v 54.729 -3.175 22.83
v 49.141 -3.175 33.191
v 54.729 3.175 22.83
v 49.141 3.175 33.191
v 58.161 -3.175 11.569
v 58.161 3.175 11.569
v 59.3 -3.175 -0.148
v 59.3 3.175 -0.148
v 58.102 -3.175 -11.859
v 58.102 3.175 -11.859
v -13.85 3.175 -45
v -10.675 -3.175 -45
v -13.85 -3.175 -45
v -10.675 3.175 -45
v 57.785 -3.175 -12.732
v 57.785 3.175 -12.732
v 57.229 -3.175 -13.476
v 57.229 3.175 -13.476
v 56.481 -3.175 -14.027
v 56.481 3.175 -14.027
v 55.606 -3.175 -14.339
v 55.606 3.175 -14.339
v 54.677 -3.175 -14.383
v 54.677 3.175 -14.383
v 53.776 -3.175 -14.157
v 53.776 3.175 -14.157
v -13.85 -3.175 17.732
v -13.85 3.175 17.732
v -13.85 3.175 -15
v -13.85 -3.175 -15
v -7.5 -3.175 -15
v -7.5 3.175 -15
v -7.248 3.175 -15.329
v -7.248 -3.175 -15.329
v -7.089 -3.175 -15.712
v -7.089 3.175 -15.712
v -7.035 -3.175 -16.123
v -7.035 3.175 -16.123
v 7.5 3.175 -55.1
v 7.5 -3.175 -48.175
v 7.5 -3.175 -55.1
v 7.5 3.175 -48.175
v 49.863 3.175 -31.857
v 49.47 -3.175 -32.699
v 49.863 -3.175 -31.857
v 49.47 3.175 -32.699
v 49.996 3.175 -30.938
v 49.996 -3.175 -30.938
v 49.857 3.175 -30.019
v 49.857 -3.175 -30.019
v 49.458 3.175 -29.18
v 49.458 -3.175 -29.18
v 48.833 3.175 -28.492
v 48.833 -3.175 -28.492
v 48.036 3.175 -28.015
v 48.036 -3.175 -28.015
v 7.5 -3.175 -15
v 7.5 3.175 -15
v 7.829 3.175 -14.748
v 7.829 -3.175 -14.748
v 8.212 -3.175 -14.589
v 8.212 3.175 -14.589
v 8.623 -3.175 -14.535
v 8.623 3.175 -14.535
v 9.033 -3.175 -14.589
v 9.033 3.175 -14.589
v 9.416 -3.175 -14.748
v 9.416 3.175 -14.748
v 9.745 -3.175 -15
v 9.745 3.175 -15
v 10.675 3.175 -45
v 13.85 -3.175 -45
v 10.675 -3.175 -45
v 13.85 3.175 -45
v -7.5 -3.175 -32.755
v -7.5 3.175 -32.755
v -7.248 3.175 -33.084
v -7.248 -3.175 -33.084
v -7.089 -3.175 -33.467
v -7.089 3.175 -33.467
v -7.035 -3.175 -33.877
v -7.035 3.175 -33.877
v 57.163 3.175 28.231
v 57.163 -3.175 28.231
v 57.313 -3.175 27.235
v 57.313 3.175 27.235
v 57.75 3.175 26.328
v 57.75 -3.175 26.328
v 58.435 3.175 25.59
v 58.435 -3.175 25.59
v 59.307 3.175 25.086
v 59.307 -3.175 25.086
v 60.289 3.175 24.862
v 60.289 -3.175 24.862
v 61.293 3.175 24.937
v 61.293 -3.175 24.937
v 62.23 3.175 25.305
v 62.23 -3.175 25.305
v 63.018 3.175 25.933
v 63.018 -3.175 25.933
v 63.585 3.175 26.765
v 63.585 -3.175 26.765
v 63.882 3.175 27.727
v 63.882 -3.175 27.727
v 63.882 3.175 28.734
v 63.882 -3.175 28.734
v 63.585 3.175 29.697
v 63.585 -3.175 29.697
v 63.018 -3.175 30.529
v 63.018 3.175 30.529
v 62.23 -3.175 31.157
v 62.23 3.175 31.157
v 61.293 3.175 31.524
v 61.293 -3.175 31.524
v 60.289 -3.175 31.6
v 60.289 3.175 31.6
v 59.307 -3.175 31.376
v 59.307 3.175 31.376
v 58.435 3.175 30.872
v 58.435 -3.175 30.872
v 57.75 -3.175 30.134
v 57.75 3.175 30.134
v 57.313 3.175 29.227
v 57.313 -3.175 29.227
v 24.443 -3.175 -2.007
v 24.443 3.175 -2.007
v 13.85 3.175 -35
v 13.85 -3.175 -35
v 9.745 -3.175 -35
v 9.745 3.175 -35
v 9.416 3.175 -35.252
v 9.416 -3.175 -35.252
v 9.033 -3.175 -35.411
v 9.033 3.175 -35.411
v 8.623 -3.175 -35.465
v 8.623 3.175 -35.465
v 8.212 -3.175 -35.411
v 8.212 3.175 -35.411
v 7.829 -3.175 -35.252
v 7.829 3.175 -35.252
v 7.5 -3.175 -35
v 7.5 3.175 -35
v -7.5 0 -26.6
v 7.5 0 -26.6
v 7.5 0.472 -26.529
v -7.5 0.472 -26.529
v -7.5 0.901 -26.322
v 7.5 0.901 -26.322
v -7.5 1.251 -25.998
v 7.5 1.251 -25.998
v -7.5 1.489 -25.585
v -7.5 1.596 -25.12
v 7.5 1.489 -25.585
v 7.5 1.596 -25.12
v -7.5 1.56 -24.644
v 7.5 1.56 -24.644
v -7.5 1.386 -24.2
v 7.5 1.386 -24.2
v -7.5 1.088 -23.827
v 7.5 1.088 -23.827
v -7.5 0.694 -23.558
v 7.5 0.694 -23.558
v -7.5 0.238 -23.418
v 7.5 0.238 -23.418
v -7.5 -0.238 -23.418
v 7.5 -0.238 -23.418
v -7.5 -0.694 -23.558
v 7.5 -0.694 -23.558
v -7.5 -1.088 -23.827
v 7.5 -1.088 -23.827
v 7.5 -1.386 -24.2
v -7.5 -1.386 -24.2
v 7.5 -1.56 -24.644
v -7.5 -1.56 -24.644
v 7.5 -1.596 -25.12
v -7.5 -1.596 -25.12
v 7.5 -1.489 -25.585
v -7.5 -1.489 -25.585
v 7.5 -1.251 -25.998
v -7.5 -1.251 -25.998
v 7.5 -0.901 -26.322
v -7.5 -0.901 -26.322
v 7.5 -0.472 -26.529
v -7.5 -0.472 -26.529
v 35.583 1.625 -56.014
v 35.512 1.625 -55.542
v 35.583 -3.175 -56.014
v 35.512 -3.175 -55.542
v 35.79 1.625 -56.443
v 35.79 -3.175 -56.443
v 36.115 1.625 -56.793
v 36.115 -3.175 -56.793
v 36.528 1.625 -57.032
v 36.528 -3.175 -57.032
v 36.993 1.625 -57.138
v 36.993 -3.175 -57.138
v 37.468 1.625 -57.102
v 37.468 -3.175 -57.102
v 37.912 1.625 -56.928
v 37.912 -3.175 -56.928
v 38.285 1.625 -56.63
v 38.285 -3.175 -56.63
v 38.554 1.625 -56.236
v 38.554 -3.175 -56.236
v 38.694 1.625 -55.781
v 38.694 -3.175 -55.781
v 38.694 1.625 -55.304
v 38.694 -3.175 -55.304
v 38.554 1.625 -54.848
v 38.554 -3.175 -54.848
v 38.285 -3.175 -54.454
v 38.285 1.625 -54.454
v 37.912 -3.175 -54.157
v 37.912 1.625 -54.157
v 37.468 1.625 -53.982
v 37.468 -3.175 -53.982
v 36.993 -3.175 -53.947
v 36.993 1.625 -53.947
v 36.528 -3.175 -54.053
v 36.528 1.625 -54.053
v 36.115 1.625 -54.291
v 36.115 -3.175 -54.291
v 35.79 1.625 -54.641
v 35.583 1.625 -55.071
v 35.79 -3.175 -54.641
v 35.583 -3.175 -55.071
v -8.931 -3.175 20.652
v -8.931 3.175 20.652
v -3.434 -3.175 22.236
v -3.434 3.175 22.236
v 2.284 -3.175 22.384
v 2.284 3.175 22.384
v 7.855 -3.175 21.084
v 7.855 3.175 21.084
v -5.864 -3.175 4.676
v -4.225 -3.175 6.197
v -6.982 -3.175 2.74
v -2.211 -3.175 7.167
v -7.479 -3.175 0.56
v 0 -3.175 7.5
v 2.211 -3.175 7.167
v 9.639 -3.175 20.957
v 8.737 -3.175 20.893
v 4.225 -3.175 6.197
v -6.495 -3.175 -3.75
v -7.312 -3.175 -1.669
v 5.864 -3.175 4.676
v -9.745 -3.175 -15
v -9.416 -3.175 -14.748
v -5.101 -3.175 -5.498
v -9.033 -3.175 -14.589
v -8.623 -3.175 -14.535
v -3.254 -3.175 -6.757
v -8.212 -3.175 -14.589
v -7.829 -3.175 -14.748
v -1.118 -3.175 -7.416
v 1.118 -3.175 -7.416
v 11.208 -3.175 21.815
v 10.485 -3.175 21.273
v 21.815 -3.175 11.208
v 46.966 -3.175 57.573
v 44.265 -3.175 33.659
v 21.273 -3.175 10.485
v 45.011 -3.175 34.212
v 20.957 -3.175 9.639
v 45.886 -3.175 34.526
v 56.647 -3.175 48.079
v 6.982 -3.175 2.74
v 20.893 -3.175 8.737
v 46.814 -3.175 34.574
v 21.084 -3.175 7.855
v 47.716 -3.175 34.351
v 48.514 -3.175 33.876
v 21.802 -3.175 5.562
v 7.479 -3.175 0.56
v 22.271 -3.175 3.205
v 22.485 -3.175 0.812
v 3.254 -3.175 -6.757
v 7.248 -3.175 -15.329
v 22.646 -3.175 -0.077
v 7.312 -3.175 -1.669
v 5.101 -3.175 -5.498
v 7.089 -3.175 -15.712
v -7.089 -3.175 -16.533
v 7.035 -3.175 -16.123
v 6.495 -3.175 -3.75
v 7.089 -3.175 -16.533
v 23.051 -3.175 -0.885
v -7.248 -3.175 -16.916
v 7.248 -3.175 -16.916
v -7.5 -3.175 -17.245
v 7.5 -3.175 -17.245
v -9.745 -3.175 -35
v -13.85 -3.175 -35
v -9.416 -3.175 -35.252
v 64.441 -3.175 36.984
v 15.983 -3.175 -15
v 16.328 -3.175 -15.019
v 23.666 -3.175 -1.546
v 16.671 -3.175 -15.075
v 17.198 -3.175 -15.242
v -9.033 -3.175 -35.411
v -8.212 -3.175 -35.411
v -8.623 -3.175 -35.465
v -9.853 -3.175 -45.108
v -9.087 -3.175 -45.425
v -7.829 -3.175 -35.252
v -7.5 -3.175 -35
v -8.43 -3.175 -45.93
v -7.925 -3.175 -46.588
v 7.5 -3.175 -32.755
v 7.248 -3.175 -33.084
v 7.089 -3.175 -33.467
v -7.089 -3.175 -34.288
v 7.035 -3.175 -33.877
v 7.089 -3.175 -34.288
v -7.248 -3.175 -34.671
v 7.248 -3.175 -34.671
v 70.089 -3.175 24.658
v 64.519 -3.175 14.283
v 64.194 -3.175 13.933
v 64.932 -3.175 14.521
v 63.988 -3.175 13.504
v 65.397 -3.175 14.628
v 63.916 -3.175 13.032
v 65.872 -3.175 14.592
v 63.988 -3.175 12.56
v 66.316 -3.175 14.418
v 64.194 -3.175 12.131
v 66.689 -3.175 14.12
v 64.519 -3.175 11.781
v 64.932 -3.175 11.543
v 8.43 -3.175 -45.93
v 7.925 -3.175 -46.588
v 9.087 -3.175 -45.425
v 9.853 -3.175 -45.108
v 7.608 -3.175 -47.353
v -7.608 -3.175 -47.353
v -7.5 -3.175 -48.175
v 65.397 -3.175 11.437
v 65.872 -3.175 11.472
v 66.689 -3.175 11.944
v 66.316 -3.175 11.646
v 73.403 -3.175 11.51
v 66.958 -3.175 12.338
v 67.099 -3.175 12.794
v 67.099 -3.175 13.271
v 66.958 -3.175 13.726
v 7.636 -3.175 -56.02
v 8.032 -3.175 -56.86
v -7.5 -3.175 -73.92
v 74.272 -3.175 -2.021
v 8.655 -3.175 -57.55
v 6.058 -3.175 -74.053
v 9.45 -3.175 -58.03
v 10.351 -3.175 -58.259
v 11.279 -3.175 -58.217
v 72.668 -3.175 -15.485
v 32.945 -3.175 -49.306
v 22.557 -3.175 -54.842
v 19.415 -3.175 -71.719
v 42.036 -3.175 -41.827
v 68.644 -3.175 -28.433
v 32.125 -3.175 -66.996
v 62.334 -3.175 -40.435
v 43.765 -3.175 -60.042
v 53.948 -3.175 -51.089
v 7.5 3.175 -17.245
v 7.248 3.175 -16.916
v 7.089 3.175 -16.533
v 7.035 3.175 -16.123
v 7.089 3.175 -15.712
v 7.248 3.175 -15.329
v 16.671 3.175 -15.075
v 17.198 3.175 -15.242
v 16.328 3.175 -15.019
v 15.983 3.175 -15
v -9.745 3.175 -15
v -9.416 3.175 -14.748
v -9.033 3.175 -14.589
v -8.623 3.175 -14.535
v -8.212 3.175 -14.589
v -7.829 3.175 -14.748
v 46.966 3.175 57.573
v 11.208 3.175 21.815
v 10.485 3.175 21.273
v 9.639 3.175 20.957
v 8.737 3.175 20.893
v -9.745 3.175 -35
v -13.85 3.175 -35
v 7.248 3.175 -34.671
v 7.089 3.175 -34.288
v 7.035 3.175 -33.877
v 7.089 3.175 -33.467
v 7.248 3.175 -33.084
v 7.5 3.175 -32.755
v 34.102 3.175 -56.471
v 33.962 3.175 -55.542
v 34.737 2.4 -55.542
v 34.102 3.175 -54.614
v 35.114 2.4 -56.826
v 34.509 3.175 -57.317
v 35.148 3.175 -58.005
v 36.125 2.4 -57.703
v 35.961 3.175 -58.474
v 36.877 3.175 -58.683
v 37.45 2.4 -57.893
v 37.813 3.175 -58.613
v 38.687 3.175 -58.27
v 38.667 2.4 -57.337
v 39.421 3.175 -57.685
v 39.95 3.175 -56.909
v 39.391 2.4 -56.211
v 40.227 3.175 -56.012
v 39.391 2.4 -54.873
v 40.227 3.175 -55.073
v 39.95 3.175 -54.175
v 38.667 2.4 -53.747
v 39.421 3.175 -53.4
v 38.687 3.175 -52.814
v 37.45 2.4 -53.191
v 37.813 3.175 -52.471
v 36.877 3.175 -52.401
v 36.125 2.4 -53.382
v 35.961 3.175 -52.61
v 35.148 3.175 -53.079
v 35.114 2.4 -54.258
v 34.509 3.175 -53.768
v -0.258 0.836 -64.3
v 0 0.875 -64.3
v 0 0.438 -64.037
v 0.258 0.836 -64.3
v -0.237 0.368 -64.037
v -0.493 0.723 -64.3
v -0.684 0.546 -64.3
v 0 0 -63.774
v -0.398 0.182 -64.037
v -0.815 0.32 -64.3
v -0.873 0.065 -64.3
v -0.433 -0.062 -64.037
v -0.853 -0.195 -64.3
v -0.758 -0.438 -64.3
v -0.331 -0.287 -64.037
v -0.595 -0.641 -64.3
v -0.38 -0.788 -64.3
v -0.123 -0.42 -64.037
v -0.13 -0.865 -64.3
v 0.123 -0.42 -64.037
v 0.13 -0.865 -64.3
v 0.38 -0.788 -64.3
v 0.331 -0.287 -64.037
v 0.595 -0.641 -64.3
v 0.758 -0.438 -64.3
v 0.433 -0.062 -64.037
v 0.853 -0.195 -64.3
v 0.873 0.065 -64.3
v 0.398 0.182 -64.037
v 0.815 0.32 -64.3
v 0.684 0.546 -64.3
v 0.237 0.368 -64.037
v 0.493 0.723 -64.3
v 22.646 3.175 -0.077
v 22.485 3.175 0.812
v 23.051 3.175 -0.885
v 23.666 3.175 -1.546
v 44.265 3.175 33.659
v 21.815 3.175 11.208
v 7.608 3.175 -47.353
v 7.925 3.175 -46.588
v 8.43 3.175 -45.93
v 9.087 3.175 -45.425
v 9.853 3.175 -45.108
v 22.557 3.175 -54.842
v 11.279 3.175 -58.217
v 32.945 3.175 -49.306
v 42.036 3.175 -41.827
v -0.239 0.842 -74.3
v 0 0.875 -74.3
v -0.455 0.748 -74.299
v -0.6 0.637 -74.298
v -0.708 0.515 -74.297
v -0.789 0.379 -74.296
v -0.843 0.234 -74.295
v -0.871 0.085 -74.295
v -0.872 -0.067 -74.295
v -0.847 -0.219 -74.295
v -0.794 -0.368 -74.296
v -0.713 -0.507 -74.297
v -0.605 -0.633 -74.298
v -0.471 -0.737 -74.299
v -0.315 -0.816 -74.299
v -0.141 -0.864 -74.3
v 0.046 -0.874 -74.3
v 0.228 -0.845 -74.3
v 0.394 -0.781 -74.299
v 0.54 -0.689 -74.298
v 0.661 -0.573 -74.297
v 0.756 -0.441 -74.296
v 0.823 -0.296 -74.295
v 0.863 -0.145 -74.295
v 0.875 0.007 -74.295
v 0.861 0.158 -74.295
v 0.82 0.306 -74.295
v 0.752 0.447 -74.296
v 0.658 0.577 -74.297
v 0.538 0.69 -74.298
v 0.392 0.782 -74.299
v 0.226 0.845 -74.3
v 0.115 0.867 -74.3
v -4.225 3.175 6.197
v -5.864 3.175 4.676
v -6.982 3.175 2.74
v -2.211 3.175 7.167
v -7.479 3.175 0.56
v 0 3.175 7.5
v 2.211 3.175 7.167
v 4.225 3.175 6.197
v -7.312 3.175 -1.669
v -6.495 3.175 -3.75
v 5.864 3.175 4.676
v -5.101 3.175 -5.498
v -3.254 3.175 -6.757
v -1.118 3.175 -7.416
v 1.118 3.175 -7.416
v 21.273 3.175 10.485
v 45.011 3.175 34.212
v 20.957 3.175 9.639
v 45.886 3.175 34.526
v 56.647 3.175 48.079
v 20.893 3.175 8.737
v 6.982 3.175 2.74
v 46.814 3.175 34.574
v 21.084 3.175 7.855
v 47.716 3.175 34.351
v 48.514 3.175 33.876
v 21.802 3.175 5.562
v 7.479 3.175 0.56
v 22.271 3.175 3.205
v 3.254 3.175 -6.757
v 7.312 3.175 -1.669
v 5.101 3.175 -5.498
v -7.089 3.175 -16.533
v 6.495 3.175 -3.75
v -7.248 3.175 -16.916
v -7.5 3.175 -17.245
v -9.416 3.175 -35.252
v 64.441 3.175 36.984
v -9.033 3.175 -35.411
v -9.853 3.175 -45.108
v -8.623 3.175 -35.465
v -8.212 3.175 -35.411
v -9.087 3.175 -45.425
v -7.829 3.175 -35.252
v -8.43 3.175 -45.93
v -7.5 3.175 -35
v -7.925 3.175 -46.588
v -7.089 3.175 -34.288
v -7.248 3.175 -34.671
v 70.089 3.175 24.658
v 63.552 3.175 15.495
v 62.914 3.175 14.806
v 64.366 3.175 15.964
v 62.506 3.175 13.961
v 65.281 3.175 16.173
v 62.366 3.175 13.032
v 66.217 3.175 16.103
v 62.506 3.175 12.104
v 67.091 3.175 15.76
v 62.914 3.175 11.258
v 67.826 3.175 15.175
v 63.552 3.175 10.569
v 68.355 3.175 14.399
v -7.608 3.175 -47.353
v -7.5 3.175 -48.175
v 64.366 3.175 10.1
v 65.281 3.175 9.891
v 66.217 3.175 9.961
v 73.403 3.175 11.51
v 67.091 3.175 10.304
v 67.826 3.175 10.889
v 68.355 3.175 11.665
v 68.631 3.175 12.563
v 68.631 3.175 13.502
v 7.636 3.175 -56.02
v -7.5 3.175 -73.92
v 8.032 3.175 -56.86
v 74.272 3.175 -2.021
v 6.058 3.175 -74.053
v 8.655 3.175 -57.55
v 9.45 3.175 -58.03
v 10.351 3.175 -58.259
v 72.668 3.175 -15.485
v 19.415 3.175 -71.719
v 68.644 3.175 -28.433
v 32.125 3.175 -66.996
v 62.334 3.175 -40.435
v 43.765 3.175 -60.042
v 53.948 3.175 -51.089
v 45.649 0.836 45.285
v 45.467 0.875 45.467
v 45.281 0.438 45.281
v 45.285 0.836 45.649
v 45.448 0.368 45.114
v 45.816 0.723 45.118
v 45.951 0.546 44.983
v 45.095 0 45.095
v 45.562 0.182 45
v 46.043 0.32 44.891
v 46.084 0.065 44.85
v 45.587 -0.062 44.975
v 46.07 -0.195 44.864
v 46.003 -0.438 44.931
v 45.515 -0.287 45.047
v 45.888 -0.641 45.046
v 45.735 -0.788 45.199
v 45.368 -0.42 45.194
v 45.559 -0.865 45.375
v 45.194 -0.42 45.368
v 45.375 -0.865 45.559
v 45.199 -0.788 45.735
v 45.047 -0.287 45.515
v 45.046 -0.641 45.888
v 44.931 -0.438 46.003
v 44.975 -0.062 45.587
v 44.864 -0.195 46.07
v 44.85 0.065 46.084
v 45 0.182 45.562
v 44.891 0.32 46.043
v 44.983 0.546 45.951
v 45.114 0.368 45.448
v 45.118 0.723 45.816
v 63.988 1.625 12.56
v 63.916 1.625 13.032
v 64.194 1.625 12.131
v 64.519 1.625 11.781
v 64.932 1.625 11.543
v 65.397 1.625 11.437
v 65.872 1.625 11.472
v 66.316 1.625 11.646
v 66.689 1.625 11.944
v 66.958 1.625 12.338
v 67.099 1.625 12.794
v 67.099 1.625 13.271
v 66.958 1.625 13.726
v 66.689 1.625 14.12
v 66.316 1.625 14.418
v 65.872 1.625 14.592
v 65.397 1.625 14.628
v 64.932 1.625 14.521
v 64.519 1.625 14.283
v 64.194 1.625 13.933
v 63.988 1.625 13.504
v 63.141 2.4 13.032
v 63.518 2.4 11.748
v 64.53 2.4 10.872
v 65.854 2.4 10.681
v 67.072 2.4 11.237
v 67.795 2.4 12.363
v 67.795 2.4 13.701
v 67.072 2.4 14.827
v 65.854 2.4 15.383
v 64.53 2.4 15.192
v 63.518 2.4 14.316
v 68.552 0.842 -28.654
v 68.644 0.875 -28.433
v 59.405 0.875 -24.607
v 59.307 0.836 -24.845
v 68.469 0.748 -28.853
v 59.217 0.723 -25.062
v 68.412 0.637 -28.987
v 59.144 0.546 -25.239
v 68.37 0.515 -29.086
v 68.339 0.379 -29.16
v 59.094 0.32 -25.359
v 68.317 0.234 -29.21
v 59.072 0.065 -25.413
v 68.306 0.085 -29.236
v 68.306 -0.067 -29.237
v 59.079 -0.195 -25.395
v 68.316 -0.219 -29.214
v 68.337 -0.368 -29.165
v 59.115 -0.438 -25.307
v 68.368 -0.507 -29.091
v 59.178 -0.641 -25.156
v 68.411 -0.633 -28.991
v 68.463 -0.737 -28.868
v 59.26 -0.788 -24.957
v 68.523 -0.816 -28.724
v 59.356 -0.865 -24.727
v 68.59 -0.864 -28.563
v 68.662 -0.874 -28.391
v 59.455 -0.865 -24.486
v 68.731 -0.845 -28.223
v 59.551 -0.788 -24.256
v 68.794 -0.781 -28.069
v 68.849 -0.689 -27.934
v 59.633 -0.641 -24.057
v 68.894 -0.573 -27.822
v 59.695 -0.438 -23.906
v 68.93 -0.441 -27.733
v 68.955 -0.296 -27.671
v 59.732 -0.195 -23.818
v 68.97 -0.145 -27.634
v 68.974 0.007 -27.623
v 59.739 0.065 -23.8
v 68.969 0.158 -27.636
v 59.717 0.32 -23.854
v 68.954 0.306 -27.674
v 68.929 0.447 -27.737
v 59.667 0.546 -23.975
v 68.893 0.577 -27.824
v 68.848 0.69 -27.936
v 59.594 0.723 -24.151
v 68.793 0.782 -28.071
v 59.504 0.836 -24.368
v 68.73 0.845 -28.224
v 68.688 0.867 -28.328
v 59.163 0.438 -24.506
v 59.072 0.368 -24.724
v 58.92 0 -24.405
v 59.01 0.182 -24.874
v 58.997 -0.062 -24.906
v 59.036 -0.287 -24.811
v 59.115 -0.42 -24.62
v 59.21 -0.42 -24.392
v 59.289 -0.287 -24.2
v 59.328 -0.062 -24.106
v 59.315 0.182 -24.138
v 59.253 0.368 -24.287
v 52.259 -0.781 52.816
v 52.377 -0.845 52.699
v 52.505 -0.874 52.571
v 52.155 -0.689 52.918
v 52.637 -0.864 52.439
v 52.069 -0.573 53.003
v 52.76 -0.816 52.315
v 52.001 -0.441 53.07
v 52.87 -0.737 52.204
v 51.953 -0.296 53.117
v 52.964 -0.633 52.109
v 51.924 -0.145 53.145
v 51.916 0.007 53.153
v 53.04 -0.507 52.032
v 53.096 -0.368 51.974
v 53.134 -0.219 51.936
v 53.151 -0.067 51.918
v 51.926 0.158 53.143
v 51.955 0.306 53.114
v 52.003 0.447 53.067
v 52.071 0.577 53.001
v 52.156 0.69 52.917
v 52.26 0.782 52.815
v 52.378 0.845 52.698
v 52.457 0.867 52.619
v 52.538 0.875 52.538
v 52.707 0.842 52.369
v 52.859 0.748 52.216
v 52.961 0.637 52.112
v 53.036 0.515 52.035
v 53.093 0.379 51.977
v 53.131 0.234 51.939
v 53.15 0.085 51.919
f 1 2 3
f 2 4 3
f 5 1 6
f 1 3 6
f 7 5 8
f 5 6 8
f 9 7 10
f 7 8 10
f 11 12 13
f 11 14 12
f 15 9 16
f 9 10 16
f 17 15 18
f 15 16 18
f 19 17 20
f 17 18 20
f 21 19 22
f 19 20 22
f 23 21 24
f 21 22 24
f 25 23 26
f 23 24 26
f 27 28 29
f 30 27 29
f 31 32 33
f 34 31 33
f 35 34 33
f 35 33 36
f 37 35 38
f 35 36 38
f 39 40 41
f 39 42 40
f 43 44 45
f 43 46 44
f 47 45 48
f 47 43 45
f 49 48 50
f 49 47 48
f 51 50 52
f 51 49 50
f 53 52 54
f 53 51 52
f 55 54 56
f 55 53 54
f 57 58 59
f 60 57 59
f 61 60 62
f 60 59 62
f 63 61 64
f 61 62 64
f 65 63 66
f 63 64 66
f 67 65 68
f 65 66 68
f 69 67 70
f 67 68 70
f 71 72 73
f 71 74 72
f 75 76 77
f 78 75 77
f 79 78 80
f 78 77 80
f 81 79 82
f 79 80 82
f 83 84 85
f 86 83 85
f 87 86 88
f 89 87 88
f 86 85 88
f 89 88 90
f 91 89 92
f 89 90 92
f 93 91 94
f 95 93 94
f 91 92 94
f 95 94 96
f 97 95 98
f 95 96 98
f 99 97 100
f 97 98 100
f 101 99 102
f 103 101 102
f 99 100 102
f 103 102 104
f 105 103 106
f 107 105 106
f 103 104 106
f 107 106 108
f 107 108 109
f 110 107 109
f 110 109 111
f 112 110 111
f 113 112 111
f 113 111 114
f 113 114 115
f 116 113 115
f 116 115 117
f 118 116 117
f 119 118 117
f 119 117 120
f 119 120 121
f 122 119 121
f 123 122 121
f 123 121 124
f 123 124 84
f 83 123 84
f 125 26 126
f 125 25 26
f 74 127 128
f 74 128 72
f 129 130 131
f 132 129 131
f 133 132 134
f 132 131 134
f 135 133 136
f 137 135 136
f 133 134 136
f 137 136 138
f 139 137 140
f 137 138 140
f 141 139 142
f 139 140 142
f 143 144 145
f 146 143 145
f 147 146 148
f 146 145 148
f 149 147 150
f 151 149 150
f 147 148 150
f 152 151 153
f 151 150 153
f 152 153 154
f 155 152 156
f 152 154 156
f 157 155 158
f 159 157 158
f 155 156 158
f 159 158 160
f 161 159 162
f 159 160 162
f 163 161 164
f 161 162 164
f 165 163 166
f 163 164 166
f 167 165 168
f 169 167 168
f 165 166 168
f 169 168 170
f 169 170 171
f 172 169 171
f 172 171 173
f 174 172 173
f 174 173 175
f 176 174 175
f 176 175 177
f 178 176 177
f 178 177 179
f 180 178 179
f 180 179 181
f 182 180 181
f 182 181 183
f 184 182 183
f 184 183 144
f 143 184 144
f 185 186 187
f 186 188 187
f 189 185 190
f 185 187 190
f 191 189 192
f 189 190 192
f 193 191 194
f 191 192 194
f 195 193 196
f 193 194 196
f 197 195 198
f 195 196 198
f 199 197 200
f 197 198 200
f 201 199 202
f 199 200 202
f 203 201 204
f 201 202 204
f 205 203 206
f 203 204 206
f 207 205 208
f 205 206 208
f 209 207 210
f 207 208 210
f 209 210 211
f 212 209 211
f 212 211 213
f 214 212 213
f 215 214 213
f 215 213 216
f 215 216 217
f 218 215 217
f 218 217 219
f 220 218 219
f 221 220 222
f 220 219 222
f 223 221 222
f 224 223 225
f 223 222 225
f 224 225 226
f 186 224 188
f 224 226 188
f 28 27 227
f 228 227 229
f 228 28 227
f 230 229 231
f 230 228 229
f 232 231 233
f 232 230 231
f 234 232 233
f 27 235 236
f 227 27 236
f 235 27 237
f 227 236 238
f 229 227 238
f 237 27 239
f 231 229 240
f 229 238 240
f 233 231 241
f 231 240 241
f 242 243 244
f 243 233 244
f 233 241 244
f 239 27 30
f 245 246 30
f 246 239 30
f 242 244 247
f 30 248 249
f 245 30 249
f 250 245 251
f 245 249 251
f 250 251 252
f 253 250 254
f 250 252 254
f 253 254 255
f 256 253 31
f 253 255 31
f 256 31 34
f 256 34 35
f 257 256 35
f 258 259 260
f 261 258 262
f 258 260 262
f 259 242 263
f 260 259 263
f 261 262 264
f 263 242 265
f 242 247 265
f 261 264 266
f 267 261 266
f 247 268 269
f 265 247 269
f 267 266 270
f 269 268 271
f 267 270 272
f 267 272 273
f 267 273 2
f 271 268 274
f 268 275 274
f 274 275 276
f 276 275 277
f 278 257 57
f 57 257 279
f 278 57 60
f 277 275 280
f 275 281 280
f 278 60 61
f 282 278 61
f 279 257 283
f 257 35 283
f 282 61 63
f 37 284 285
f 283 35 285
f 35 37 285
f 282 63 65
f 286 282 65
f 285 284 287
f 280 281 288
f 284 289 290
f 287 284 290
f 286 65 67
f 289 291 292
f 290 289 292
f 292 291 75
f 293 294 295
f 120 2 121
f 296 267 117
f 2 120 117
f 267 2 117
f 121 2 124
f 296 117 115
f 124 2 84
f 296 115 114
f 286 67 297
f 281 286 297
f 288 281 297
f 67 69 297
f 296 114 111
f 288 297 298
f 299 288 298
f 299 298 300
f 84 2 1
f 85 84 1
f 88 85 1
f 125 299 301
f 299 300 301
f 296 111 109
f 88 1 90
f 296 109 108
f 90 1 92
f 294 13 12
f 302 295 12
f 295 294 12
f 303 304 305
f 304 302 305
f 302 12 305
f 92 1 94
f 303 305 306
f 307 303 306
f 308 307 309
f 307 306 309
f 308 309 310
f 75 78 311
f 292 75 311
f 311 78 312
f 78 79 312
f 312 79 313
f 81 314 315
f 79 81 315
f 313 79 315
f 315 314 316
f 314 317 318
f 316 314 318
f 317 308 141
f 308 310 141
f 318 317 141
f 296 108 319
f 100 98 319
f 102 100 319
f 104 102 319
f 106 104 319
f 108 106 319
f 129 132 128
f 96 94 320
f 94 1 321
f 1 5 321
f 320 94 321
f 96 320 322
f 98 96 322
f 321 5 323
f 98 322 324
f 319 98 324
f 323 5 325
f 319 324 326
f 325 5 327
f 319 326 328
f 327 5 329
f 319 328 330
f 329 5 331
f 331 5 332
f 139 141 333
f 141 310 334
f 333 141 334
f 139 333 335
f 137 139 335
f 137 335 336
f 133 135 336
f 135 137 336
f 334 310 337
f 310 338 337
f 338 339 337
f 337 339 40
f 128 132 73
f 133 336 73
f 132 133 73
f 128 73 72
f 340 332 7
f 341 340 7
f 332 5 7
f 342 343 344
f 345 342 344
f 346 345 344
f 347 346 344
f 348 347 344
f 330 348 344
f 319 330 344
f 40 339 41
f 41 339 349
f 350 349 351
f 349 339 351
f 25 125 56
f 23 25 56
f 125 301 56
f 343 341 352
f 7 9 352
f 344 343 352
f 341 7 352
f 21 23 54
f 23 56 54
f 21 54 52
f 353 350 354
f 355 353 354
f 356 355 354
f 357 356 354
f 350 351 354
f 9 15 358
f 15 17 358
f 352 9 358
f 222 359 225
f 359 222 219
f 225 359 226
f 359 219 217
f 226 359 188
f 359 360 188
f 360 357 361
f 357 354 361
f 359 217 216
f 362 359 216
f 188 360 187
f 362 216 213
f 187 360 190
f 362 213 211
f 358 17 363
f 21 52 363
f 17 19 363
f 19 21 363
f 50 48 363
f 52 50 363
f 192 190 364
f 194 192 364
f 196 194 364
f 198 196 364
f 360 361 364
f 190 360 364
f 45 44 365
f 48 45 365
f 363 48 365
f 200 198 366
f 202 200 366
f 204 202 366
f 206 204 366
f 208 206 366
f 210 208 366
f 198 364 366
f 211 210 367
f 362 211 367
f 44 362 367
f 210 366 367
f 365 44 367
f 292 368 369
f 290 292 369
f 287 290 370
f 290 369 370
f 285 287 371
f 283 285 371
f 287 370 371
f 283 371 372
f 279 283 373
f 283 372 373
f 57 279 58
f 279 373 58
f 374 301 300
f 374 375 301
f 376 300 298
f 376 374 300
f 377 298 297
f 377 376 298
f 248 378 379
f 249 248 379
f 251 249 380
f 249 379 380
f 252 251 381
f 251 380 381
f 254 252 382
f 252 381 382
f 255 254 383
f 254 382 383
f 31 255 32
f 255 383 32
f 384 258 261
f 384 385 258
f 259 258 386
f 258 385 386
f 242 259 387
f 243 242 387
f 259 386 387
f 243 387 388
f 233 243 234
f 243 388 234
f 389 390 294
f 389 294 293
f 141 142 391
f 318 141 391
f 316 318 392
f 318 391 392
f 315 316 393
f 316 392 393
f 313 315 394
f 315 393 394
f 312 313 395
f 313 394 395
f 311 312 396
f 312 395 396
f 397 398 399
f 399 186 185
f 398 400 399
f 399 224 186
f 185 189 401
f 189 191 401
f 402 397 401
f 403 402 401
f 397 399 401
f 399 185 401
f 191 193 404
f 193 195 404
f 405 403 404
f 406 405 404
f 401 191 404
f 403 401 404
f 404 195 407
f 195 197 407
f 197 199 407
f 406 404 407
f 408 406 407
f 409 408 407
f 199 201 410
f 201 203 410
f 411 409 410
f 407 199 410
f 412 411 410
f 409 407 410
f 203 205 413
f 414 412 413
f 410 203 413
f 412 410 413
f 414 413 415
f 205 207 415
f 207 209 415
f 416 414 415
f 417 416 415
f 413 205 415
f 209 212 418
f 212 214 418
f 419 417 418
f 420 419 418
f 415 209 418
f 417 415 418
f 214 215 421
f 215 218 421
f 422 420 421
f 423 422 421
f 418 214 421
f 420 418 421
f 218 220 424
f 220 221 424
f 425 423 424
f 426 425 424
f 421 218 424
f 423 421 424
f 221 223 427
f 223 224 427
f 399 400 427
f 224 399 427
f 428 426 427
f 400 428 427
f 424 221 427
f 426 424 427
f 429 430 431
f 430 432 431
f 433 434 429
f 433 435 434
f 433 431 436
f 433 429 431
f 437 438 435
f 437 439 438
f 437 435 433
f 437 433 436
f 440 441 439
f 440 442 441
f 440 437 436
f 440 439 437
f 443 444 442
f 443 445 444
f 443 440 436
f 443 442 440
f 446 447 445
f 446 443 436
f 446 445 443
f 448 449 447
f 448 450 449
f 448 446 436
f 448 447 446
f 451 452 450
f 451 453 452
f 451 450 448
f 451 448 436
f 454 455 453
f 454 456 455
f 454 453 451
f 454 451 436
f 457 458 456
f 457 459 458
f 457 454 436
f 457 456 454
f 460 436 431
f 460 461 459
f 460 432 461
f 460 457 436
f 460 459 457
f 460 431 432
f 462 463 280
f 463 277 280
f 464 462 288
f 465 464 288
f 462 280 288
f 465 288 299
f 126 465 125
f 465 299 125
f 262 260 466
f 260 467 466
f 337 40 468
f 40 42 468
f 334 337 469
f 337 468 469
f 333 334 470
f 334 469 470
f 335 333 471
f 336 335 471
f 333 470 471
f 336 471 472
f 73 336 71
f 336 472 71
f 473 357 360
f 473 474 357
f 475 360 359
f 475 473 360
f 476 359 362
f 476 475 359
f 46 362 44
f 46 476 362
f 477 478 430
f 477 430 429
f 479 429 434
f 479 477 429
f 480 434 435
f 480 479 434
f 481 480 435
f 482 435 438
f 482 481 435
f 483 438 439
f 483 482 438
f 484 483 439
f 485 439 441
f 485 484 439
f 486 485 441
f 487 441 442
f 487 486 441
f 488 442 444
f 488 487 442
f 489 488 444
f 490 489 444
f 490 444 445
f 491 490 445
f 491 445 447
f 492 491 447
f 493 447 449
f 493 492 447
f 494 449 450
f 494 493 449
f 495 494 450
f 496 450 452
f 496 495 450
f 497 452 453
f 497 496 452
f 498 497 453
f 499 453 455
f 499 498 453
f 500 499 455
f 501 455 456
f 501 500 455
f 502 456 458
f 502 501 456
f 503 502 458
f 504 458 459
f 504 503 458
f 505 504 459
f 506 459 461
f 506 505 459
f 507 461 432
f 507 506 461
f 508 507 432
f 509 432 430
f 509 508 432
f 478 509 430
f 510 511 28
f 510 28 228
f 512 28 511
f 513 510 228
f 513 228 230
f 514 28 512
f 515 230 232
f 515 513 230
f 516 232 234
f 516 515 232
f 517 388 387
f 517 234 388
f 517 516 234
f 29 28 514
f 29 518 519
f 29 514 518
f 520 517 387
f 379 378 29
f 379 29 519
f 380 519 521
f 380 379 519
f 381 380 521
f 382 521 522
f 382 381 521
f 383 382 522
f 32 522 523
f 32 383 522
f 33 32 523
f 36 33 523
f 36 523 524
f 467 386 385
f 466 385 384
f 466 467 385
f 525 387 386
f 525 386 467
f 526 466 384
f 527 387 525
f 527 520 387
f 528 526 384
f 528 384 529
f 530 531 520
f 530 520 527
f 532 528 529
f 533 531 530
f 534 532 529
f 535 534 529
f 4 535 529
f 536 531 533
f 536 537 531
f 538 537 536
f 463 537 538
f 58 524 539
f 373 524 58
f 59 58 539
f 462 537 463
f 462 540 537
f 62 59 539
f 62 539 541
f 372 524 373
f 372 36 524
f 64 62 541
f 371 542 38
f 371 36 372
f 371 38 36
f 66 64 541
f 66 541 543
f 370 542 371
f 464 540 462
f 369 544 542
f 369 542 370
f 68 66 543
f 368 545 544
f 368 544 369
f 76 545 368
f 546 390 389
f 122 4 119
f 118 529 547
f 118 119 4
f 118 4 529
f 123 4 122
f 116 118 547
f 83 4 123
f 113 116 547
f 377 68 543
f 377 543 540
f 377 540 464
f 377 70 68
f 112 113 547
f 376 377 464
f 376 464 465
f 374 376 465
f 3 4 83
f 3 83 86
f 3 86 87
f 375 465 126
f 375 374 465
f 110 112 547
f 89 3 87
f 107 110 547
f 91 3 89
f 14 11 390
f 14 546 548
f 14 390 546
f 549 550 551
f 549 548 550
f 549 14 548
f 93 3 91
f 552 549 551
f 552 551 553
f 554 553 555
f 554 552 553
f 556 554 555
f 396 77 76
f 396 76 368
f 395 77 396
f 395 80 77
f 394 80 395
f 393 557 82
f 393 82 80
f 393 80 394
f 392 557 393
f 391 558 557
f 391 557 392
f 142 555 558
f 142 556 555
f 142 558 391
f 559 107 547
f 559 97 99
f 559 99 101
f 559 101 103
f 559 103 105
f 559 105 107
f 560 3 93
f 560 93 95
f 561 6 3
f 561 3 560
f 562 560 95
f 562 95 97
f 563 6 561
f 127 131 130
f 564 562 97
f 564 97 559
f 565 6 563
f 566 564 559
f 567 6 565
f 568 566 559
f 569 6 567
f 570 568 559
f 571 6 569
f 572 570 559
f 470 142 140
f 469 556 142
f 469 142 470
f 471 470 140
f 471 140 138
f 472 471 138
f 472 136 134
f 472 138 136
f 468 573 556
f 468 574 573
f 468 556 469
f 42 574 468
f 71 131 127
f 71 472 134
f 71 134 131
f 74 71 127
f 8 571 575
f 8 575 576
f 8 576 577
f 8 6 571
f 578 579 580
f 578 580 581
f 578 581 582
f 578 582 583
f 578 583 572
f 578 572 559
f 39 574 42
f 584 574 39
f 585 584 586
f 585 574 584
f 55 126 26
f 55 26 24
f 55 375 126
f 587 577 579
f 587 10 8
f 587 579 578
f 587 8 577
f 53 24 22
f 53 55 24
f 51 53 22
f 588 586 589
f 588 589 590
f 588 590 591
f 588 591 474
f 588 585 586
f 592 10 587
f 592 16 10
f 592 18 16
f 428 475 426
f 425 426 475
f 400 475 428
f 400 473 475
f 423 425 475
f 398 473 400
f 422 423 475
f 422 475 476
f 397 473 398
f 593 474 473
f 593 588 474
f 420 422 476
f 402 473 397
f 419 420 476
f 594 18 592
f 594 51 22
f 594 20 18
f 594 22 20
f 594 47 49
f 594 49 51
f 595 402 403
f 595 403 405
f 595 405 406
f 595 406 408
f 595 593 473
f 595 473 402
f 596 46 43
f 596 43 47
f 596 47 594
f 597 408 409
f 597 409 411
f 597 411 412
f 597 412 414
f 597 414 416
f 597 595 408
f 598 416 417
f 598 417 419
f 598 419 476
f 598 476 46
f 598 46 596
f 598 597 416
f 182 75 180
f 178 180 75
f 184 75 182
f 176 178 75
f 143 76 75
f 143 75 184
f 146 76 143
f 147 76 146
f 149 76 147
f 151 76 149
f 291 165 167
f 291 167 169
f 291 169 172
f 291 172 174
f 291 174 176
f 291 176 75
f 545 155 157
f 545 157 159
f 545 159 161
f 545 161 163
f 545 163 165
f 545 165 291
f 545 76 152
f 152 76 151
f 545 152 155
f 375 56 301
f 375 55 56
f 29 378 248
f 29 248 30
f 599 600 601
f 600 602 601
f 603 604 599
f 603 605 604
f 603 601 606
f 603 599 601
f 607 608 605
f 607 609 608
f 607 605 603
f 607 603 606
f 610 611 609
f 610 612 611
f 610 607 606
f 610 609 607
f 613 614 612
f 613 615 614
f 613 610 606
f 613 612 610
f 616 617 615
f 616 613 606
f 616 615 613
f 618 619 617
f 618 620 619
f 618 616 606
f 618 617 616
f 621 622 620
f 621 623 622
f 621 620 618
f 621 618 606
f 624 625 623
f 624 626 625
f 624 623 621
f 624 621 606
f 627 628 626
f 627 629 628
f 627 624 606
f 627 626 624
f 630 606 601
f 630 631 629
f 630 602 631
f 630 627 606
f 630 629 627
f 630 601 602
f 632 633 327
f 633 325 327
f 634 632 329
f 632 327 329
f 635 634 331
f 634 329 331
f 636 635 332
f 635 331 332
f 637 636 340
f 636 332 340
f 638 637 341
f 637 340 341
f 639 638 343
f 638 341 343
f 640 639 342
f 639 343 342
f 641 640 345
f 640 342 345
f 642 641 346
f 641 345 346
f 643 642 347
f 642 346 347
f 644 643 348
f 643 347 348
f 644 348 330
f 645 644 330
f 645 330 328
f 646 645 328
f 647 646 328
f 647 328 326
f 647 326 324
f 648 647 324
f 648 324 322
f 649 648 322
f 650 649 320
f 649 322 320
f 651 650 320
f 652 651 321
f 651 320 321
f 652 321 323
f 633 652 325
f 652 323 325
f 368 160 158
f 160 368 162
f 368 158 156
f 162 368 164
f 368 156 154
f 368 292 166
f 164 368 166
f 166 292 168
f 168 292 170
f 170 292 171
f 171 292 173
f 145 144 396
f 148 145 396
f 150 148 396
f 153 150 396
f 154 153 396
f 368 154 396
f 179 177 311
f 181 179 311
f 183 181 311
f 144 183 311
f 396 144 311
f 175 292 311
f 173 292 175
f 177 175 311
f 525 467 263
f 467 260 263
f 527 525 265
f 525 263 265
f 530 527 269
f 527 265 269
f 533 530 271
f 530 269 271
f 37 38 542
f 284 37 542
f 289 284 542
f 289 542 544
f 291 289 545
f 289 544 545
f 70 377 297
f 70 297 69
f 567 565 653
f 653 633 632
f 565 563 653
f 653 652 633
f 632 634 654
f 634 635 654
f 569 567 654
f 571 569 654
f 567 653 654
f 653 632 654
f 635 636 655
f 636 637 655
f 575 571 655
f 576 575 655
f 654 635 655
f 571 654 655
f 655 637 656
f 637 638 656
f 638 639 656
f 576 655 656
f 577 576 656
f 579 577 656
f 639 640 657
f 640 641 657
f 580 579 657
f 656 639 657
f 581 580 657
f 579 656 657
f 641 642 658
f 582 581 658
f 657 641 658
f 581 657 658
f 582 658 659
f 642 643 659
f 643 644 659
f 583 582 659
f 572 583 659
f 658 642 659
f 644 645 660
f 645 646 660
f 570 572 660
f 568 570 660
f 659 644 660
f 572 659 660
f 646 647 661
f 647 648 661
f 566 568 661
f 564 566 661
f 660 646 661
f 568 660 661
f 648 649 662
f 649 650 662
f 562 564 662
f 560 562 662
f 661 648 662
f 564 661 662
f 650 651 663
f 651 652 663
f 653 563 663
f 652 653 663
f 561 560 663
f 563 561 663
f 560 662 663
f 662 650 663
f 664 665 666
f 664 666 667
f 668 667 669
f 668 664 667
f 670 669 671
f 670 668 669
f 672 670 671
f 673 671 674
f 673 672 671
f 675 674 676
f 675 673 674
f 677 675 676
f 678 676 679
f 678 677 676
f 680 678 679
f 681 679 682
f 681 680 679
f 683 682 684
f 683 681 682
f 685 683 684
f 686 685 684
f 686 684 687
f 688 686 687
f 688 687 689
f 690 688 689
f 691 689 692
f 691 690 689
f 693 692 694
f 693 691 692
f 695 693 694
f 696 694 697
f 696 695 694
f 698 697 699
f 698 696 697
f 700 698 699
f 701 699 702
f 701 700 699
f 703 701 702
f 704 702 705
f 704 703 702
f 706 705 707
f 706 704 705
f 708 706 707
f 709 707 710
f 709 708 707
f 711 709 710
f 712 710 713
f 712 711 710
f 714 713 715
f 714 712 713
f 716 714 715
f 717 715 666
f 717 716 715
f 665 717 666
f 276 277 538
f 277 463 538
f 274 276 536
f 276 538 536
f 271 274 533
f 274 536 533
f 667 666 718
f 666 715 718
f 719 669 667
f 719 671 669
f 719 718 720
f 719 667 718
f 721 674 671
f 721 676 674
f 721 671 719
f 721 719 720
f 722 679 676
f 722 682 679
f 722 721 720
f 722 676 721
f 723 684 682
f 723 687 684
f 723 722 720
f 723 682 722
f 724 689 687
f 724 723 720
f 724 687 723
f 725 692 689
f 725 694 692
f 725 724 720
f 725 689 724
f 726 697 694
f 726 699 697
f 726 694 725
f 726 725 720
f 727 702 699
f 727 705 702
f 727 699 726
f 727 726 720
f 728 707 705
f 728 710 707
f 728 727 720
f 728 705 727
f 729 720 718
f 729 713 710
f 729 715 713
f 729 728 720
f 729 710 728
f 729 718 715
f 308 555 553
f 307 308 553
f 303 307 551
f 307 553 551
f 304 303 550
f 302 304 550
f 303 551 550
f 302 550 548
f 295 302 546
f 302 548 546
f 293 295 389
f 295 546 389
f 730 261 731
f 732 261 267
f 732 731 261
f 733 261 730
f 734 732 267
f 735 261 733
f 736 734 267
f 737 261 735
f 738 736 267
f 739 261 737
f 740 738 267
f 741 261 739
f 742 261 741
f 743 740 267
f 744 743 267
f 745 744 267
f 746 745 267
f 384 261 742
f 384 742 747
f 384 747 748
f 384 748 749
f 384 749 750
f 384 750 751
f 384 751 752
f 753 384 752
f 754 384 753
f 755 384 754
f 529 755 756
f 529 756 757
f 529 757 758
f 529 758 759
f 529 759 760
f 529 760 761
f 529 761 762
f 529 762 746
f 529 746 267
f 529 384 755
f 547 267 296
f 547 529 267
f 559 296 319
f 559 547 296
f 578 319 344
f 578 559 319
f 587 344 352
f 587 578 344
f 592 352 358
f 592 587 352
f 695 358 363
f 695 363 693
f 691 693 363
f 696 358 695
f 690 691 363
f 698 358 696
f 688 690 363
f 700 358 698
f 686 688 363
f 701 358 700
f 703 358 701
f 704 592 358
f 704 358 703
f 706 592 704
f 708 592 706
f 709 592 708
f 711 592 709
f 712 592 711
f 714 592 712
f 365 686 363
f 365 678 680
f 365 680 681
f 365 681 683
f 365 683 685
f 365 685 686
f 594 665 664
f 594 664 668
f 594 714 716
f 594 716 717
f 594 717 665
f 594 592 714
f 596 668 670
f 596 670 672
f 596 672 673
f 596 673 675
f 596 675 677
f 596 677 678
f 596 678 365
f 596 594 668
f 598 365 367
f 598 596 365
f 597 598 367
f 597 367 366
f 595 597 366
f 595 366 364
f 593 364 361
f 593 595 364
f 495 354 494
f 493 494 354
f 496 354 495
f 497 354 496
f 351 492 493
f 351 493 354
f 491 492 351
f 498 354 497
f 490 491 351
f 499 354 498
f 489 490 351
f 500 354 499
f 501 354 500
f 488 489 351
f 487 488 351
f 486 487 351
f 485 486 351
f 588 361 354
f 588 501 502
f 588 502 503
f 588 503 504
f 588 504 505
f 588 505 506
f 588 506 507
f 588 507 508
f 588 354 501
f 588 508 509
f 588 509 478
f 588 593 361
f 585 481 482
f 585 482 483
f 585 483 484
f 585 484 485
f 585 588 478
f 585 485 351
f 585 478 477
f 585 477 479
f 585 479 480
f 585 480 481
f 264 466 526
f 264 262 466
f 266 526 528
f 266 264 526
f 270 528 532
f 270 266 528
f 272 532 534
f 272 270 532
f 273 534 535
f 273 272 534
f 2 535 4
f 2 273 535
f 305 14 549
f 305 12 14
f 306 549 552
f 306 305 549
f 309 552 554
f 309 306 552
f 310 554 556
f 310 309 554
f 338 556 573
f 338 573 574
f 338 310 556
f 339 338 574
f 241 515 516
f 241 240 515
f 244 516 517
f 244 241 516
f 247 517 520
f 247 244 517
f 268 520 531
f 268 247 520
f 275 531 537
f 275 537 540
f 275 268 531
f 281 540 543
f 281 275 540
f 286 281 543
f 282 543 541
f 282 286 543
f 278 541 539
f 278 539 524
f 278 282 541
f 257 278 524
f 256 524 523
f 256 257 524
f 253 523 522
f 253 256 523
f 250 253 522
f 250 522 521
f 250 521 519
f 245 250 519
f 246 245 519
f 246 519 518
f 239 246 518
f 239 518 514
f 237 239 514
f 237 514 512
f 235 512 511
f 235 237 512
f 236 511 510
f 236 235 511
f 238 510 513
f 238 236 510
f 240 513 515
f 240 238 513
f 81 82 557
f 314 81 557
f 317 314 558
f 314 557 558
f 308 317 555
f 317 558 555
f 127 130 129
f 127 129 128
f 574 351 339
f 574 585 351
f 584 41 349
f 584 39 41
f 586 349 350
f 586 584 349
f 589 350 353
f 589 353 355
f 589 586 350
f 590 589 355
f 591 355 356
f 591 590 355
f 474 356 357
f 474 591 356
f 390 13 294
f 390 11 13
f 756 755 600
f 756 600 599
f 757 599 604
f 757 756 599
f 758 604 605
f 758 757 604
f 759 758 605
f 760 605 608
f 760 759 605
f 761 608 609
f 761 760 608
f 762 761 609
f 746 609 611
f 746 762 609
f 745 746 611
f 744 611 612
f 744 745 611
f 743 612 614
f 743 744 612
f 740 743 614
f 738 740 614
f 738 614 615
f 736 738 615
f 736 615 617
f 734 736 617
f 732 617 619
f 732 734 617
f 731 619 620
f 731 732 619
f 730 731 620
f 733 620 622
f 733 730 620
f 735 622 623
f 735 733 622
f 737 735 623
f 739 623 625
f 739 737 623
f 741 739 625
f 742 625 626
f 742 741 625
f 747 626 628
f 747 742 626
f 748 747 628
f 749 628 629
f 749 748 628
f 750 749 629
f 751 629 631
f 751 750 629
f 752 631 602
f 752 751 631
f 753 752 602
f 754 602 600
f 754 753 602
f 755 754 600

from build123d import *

# Parameters (mm, degrees)
SKETCH1_R                                       = 7.5
BOSS_EXTRUDE1_DEPTH                             = 3.175
CIRPATTERN1_COUNT                               = 3
CIRPATTERN1_ANGLE                               = 135
M3_CLEARANCE_HOLE1_D                            = 3.2
M3_CLEARANCE_HOLE1_DEPTH                        = 15
CSK_FOR_M3_FLAT_HEAD_MACHINE_SCREW1_D           = 3.2
CSK_FOR_M3_FLAT_HEAD_MACHINE_SCREW1_CSINK_D     = 6.3
CSK_FOR_M3_FLAT_HEAD_MACHINE_SCREW1_CSINK_ANGLE = 90
CUT_EXTRUDE1_REACH                              = 107.268
FILLET1_R                                       = 3.175
CUT_EXTRUDE2_REACH                              = 107.268
SKETCH11_W                                      = 9.65
SKETCH11_H                                      = 32.732103654
F_1_4_CLEARANCE_HOLE1_D                         = 6.7564


with BuildPart() as part:
    # Sketch1 → Boss-Extrude1 (new, symmetric)
    with BuildSketch(Plane(origin=(0, 0, 0), x_dir=(1, 0, 0), z_dir=(0, 1, 0))):
        with BuildLine():
            Line((-13.85, 35), (-7.5, 35))
            Line((-7.5, 35), (-7.5, 15))
            Line((-7.5, 15), (-16.770509831, 15))
            ThreePointArc((-16.770509831, 15), (-18.002512666, -13.496649128), (9.696699141, -20.303300859))
            Line((9.696699141, -20.303300859), (46.966384428, -57.572986146))
            ThreePointArc((46.966384428, -57.572986146), (68.644249266, 28.433379025), (-7.5, 73.920497834))
            Line((-7.5, 73.920497834), (-7.5, 45))
            Line((-7.5, 45), (-13.85, 45))
            Line((-13.85, 45), (-13.85, 35))
        make_face()
        with Locations(Location((0, 0, 0), (0, 0, 270))):
            Circle(SKETCH1_R, mode=Mode.SUBTRACT)
        with BuildLine():
            Line((20.303300859, -9.696699141), (46.898012061, -36.291410343))
            ThreePointArc((46.898012061, -36.291410343), (58.160567128, -11.568856096), (57.216234934, 15.581798996))
            Line((57.216234934, 15.581798996), (22.468570216, 1.188845008))
            ThreePointArc((22.468570216, 1.188845008), (22.067668809, -4.389532245), (20.303300859, -9.696699141))
        make_face(mode=Mode.SUBTRACT)
        with BuildLine():
            Line((7.5, 15), (7.5, 35))
            Line((7.5, 35), (13.85, 35))
            Line((13.85, 35), (13.85, 45))
            Line((13.85, 45), (7.5, 45))
            Line((7.5, 45), (7.5, 58.823804705))
            ThreePointArc((7.5, 58.823804705), (32.945314818, 49.30614801), (51.475983449, 29.439991983))
            Line((51.475983449, 29.439991983), (16.72831873, 15.047037996))
            Line((16.72831873, 15.047037996), (16.614758962, 15))
            Line((16.614758962, 15), (7.5, 15))
        make_face(mode=Mode.SUBTRACT)
    extrude(amount=BOSS_EXTRUDE1_DEPTH, both=True)

    # Sketch5 → M2.2x0.45 Tapped Hole1 (revolve, cut)
    with BuildSketch(Plane(origin=(0, 0, -74.3), x_dir=(0, 1, 0), z_dir=(1, 0, 0))):
        Polygon((0, 0), (0, 10.525753042), (0.875, 10), (0.875, 0), align=None)
    m2_2x0_45_tapped_hole1 = revolve(axis=Axis((0, 0, -80.65), (0, 0, 1)), mode=Mode.SUBTRACT)

    # CirPattern1: M2.2x0.45 Tapped Hole1 ×3 about axis
    cirpattern1_axis = Axis((0, 3.175, 0), (0, -1, 0))
    for i in range(1, CIRPATTERN1_COUNT):
        add(m2_2x0_45_tapped_hole1.rotate(cirpattern1_axis, i * CIRPATTERN1_ANGLE / (CIRPATTERN1_COUNT - 1)), mode=Mode.SUBTRACT)

    # M3 Clearance Hole1
    with Locations(Plane.ZY.offset(7.5)):
        with Locations((-25, 0)):
            Hole(M3_CLEARANCE_HOLE1_D / 2, depth=M3_CLEARANCE_HOLE1_DEPTH)

    # CSK for M3 Flat Head Machine Screw1 (through all)
    with Locations(Plane(origin=(0, 3.175, 0), x_dir=(1, 0, 0), z_dir=(0, 1, 0))):
        with Locations((65.516456731, -13.032033511), (37.112091566, 55.542170102)):
            CounterSinkHole(CSK_FOR_M3_FLAT_HEAD_MACHINE_SCREW1_D / 2, CSK_FOR_M3_FLAT_HEAD_MACHINE_SCREW1_CSINK_D / 2, counter_sink_angle=CSK_FOR_M3_FLAT_HEAD_MACHINE_SCREW1_CSINK_ANGLE)

    # Sketch10 → Cut-Extrude1 (cut, up to next)
    with BuildSketch(Plane(origin=(0, 3.175, 0), x_dir=(1, 0, 0), z_dir=(0, 1, 0)), mode=Mode.PRIVATE) as cut_extrude1_sk1:
        with BuildLine():
            Line((-8.622532015, 15), (-9.74506403, 15))
            ThreePointArc((-9.74506403, 15), (-8.622532015, 14.535032015), (-7.5, 15))
            Line((-7.5, 15), (-8.622532015, 15))
        make_face()
    cut_extrude1_tool1 = extrude(cut_extrude1_sk1.sketch, amount=-CUT_EXTRUDE1_REACH, mode=Mode.PRIVATE) & part.part
    # Sketch10 → Cut-Extrude1 (cut, up to next)
    with BuildSketch(Plane(origin=(0, 3.175, 0), x_dir=(1, 0, 0), z_dir=(0, 1, 0)), mode=Mode.PRIVATE) as cut_extrude1_sk2:
        with BuildLine():
            ThreePointArc((-7.035032015, 16.122532015), (-7.155873257, 16.730041964), (-7.5, 17.24506403))
            Line((-7.5, 17.24506403), (-7.5, 16.122532015))
            Line((-7.5, 16.122532015), (-7.5, 15))
            ThreePointArc((-7.5, 15), (-7.155873257, 15.515022066), (-7.035032015, 16.122532015))
        make_face()
    cut_extrude1_tool2 = extrude(cut_extrude1_sk2.sketch, amount=-CUT_EXTRUDE1_REACH, mode=Mode.PRIVATE) & part.part
    # Sketch10 → Cut-Extrude1 (cut, up to next)
    with BuildSketch(Plane(origin=(0, 3.175, 0), x_dir=(1, 0, 0), z_dir=(0, 1, 0)), mode=Mode.PRIVATE) as cut_extrude1_sk3:
        with BuildLine():
            Line((8.622532015, 15), (7.5, 15))
            ThreePointArc((7.5, 15), (8.622532015, 14.535032015), (9.74506403, 15))
            Line((9.74506403, 15), (8.622532015, 15))
        make_face()
    cut_extrude1_tool3 = extrude(cut_extrude1_sk3.sketch, amount=-CUT_EXTRUDE1_REACH, mode=Mode.PRIVATE) & part.part
    # Sketch10 → Cut-Extrude1 (cut, up to next)
    with BuildSketch(Plane(origin=(0, 3.175, 0), x_dir=(1, 0, 0), z_dir=(0, 1, 0)), mode=Mode.PRIVATE) as cut_extrude1_sk4:
        with BuildLine():
            ThreePointArc((7.5, 17.24506403), (7.035032015, 16.122532015), (7.5, 15))
            Line((7.5, 15), (7.5, 16.122532015))
            Line((7.5, 16.122532015), (7.5, 17.24506403))
        make_face()
    cut_extrude1_tool4 = extrude(cut_extrude1_sk4.sketch, amount=-CUT_EXTRUDE1_REACH, mode=Mode.PRIVATE) & part.part
    # Sketch10 → Cut-Extrude1 (cut, up to next)
    with BuildSketch(Plane(origin=(0, 3.175, 0), x_dir=(1, 0, 0), z_dir=(0, 1, 0)), mode=Mode.PRIVATE) as cut_extrude1_sk5:
        with BuildLine():
            ThreePointArc((7.5, 35), (7.035032015, 33.877467985), (7.5, 32.75493597))
            Line((7.5, 32.75493597), (7.5, 33.877467985))
            Line((7.5, 33.877467985), (7.5, 35))
        make_face()
    cut_extrude1_tool5 = extrude(cut_extrude1_sk5.sketch, amount=-CUT_EXTRUDE1_REACH, mode=Mode.PRIVATE) & part.part
    # Sketch10 → Cut-Extrude1 (cut, up to next)
    with BuildSketch(Plane(origin=(0, 3.175, 0), x_dir=(1, 0, 0), z_dir=(0, 1, 0)), mode=Mode.PRIVATE) as cut_extrude1_sk6:
        with BuildLine():
            ThreePointArc((9.74506403, 35), (8.622532015, 35.464967985), (7.5, 35))
            Line((7.5, 35), (8.622532015, 35))
            Line((8.622532015, 35), (9.74506403, 35))
        make_face()
    cut_extrude1_tool6 = extrude(cut_extrude1_sk6.sketch, amount=-CUT_EXTRUDE1_REACH, mode=Mode.PRIVATE) & part.part
    # Sketch10 → Cut-Extrude1 (cut, up to next)
    with BuildSketch(Plane(origin=(0, 3.175, 0), x_dir=(1, 0, 0), z_dir=(0, 1, 0)), mode=Mode.PRIVATE) as cut_extrude1_sk7:
        with BuildLine():
            ThreePointArc((-7.035032015, 33.877467985), (-7.155873257, 34.484977934), (-7.5, 35))
            Line((-7.5, 35), (-7.5, 33.877467985))
            Line((-7.5, 33.877467985), (-7.5, 32.75493597))
            ThreePointArc((-7.5, 32.75493597), (-7.155873257, 33.269958036), (-7.035032015, 33.877467985))
        make_face()
    cut_extrude1_tool7 = extrude(cut_extrude1_sk7.sketch, amount=-CUT_EXTRUDE1_REACH, mode=Mode.PRIVATE) & part.part
    # Sketch10 → Cut-Extrude1 (cut, up to next)
    with BuildSketch(Plane(origin=(0, 3.175, 0), x_dir=(1, 0, 0), z_dir=(0, 1, 0)), mode=Mode.PRIVATE) as cut_extrude1_sk8:
        with BuildLine():
            Line((-8.622532015, 35), (-7.5, 35))
            ThreePointArc((-7.5, 35), (-8.622532015, 35.464967985), (-9.74506403, 35))
            Line((-9.74506403, 35), (-8.622532015, 35))
        make_face()
    cut_extrude1_tool8 = extrude(cut_extrude1_sk8.sketch, amount=-CUT_EXTRUDE1_REACH, mode=Mode.PRIVATE) & part.part
    add(cut_extrude1_tool1.solids().sort_by_distance((-8.622532, 3.175, -14.811461))[0], mode=Mode.SUBTRACT)
    add(cut_extrude1_tool2.solids().sort_by_distance((-7.311461, 3.175, -16.122532))[0], mode=Mode.SUBTRACT)
    add(cut_extrude1_tool3.solids().sort_by_distance((8.622532, 3.175, -14.811461))[0], mode=Mode.SUBTRACT)
    add(cut_extrude1_tool4.solids().sort_by_distance((7.311461, 3.175, -16.122532))[0], mode=Mode.SUBTRACT)
    add(cut_extrude1_tool5.solids().sort_by_distance((7.311461, 3.175, -33.877468))[0], mode=Mode.SUBTRACT)
    add(cut_extrude1_tool6.solids().sort_by_distance((8.622532, 3.175, -35.188539))[0], mode=Mode.SUBTRACT)
    add(cut_extrude1_tool7.solids().sort_by_distance((-7.311461, 3.175, -33.877468))[0], mode=Mode.SUBTRACT)
    add(cut_extrude1_tool8.solids().sort_by_distance((-8.622532, 3.175, -35.188539))[0], mode=Mode.SUBTRACT)

    # Fillet1
    fillet1_edges = [part.edges().sort_by_distance(p)[0] for p in [
        (-7.5, 0, -45),
        (9.696699141, 0, 20.303300859),
        (7.5, 0, -58.823804705),
        (7.5, 0, -45),
        (16.614758962, 0, -15),
        (51.475983449, 0, -29.439991983),
        (46.898012061, 0, 36.291410343),
        (57.216234934, 0, -15.581798996),
        (22.468570216, 0, -1.188845008),
        (20.303300859, 0, 9.696699141),
    ]]
    fillet(fillet1_edges, radius=FILLET1_R)

    # Sketch11 → Cut-Extrude2 (cut, up to next)
    with BuildSketch(Plane(origin=(0, 3.175, 0), x_dir=(1, 0, 0), z_dir=(0, 1, 0)), mode=Mode.PRIVATE) as cut_extrude2_sk1:
        with Locations((-18.675, -1.366051827)):
            Rectangle(SKETCH11_W, SKETCH11_H)
    cut_extrude2_tool1 = extrude(cut_extrude2_sk1.sketch, amount=-CUT_EXTRUDE2_REACH, mode=Mode.PRIVATE) & part.part
    add(cut_extrude2_tool1.solids().sort_by_distance((-18.675, 3.175, 1.366052))[0], mode=Mode.SUBTRACT)

    # 1/4 Clearance Hole1 (through all)
    with Locations(Plane(origin=(0, 3.175, 0), x_dir=(1, 0, 0), z_dir=(0, 1, 0))):
        with Locations((60.541360174, -28.230899884)):
            Hole(F_1_4_CLEARANCE_HOLE1_D / 2)


solid = part.part
